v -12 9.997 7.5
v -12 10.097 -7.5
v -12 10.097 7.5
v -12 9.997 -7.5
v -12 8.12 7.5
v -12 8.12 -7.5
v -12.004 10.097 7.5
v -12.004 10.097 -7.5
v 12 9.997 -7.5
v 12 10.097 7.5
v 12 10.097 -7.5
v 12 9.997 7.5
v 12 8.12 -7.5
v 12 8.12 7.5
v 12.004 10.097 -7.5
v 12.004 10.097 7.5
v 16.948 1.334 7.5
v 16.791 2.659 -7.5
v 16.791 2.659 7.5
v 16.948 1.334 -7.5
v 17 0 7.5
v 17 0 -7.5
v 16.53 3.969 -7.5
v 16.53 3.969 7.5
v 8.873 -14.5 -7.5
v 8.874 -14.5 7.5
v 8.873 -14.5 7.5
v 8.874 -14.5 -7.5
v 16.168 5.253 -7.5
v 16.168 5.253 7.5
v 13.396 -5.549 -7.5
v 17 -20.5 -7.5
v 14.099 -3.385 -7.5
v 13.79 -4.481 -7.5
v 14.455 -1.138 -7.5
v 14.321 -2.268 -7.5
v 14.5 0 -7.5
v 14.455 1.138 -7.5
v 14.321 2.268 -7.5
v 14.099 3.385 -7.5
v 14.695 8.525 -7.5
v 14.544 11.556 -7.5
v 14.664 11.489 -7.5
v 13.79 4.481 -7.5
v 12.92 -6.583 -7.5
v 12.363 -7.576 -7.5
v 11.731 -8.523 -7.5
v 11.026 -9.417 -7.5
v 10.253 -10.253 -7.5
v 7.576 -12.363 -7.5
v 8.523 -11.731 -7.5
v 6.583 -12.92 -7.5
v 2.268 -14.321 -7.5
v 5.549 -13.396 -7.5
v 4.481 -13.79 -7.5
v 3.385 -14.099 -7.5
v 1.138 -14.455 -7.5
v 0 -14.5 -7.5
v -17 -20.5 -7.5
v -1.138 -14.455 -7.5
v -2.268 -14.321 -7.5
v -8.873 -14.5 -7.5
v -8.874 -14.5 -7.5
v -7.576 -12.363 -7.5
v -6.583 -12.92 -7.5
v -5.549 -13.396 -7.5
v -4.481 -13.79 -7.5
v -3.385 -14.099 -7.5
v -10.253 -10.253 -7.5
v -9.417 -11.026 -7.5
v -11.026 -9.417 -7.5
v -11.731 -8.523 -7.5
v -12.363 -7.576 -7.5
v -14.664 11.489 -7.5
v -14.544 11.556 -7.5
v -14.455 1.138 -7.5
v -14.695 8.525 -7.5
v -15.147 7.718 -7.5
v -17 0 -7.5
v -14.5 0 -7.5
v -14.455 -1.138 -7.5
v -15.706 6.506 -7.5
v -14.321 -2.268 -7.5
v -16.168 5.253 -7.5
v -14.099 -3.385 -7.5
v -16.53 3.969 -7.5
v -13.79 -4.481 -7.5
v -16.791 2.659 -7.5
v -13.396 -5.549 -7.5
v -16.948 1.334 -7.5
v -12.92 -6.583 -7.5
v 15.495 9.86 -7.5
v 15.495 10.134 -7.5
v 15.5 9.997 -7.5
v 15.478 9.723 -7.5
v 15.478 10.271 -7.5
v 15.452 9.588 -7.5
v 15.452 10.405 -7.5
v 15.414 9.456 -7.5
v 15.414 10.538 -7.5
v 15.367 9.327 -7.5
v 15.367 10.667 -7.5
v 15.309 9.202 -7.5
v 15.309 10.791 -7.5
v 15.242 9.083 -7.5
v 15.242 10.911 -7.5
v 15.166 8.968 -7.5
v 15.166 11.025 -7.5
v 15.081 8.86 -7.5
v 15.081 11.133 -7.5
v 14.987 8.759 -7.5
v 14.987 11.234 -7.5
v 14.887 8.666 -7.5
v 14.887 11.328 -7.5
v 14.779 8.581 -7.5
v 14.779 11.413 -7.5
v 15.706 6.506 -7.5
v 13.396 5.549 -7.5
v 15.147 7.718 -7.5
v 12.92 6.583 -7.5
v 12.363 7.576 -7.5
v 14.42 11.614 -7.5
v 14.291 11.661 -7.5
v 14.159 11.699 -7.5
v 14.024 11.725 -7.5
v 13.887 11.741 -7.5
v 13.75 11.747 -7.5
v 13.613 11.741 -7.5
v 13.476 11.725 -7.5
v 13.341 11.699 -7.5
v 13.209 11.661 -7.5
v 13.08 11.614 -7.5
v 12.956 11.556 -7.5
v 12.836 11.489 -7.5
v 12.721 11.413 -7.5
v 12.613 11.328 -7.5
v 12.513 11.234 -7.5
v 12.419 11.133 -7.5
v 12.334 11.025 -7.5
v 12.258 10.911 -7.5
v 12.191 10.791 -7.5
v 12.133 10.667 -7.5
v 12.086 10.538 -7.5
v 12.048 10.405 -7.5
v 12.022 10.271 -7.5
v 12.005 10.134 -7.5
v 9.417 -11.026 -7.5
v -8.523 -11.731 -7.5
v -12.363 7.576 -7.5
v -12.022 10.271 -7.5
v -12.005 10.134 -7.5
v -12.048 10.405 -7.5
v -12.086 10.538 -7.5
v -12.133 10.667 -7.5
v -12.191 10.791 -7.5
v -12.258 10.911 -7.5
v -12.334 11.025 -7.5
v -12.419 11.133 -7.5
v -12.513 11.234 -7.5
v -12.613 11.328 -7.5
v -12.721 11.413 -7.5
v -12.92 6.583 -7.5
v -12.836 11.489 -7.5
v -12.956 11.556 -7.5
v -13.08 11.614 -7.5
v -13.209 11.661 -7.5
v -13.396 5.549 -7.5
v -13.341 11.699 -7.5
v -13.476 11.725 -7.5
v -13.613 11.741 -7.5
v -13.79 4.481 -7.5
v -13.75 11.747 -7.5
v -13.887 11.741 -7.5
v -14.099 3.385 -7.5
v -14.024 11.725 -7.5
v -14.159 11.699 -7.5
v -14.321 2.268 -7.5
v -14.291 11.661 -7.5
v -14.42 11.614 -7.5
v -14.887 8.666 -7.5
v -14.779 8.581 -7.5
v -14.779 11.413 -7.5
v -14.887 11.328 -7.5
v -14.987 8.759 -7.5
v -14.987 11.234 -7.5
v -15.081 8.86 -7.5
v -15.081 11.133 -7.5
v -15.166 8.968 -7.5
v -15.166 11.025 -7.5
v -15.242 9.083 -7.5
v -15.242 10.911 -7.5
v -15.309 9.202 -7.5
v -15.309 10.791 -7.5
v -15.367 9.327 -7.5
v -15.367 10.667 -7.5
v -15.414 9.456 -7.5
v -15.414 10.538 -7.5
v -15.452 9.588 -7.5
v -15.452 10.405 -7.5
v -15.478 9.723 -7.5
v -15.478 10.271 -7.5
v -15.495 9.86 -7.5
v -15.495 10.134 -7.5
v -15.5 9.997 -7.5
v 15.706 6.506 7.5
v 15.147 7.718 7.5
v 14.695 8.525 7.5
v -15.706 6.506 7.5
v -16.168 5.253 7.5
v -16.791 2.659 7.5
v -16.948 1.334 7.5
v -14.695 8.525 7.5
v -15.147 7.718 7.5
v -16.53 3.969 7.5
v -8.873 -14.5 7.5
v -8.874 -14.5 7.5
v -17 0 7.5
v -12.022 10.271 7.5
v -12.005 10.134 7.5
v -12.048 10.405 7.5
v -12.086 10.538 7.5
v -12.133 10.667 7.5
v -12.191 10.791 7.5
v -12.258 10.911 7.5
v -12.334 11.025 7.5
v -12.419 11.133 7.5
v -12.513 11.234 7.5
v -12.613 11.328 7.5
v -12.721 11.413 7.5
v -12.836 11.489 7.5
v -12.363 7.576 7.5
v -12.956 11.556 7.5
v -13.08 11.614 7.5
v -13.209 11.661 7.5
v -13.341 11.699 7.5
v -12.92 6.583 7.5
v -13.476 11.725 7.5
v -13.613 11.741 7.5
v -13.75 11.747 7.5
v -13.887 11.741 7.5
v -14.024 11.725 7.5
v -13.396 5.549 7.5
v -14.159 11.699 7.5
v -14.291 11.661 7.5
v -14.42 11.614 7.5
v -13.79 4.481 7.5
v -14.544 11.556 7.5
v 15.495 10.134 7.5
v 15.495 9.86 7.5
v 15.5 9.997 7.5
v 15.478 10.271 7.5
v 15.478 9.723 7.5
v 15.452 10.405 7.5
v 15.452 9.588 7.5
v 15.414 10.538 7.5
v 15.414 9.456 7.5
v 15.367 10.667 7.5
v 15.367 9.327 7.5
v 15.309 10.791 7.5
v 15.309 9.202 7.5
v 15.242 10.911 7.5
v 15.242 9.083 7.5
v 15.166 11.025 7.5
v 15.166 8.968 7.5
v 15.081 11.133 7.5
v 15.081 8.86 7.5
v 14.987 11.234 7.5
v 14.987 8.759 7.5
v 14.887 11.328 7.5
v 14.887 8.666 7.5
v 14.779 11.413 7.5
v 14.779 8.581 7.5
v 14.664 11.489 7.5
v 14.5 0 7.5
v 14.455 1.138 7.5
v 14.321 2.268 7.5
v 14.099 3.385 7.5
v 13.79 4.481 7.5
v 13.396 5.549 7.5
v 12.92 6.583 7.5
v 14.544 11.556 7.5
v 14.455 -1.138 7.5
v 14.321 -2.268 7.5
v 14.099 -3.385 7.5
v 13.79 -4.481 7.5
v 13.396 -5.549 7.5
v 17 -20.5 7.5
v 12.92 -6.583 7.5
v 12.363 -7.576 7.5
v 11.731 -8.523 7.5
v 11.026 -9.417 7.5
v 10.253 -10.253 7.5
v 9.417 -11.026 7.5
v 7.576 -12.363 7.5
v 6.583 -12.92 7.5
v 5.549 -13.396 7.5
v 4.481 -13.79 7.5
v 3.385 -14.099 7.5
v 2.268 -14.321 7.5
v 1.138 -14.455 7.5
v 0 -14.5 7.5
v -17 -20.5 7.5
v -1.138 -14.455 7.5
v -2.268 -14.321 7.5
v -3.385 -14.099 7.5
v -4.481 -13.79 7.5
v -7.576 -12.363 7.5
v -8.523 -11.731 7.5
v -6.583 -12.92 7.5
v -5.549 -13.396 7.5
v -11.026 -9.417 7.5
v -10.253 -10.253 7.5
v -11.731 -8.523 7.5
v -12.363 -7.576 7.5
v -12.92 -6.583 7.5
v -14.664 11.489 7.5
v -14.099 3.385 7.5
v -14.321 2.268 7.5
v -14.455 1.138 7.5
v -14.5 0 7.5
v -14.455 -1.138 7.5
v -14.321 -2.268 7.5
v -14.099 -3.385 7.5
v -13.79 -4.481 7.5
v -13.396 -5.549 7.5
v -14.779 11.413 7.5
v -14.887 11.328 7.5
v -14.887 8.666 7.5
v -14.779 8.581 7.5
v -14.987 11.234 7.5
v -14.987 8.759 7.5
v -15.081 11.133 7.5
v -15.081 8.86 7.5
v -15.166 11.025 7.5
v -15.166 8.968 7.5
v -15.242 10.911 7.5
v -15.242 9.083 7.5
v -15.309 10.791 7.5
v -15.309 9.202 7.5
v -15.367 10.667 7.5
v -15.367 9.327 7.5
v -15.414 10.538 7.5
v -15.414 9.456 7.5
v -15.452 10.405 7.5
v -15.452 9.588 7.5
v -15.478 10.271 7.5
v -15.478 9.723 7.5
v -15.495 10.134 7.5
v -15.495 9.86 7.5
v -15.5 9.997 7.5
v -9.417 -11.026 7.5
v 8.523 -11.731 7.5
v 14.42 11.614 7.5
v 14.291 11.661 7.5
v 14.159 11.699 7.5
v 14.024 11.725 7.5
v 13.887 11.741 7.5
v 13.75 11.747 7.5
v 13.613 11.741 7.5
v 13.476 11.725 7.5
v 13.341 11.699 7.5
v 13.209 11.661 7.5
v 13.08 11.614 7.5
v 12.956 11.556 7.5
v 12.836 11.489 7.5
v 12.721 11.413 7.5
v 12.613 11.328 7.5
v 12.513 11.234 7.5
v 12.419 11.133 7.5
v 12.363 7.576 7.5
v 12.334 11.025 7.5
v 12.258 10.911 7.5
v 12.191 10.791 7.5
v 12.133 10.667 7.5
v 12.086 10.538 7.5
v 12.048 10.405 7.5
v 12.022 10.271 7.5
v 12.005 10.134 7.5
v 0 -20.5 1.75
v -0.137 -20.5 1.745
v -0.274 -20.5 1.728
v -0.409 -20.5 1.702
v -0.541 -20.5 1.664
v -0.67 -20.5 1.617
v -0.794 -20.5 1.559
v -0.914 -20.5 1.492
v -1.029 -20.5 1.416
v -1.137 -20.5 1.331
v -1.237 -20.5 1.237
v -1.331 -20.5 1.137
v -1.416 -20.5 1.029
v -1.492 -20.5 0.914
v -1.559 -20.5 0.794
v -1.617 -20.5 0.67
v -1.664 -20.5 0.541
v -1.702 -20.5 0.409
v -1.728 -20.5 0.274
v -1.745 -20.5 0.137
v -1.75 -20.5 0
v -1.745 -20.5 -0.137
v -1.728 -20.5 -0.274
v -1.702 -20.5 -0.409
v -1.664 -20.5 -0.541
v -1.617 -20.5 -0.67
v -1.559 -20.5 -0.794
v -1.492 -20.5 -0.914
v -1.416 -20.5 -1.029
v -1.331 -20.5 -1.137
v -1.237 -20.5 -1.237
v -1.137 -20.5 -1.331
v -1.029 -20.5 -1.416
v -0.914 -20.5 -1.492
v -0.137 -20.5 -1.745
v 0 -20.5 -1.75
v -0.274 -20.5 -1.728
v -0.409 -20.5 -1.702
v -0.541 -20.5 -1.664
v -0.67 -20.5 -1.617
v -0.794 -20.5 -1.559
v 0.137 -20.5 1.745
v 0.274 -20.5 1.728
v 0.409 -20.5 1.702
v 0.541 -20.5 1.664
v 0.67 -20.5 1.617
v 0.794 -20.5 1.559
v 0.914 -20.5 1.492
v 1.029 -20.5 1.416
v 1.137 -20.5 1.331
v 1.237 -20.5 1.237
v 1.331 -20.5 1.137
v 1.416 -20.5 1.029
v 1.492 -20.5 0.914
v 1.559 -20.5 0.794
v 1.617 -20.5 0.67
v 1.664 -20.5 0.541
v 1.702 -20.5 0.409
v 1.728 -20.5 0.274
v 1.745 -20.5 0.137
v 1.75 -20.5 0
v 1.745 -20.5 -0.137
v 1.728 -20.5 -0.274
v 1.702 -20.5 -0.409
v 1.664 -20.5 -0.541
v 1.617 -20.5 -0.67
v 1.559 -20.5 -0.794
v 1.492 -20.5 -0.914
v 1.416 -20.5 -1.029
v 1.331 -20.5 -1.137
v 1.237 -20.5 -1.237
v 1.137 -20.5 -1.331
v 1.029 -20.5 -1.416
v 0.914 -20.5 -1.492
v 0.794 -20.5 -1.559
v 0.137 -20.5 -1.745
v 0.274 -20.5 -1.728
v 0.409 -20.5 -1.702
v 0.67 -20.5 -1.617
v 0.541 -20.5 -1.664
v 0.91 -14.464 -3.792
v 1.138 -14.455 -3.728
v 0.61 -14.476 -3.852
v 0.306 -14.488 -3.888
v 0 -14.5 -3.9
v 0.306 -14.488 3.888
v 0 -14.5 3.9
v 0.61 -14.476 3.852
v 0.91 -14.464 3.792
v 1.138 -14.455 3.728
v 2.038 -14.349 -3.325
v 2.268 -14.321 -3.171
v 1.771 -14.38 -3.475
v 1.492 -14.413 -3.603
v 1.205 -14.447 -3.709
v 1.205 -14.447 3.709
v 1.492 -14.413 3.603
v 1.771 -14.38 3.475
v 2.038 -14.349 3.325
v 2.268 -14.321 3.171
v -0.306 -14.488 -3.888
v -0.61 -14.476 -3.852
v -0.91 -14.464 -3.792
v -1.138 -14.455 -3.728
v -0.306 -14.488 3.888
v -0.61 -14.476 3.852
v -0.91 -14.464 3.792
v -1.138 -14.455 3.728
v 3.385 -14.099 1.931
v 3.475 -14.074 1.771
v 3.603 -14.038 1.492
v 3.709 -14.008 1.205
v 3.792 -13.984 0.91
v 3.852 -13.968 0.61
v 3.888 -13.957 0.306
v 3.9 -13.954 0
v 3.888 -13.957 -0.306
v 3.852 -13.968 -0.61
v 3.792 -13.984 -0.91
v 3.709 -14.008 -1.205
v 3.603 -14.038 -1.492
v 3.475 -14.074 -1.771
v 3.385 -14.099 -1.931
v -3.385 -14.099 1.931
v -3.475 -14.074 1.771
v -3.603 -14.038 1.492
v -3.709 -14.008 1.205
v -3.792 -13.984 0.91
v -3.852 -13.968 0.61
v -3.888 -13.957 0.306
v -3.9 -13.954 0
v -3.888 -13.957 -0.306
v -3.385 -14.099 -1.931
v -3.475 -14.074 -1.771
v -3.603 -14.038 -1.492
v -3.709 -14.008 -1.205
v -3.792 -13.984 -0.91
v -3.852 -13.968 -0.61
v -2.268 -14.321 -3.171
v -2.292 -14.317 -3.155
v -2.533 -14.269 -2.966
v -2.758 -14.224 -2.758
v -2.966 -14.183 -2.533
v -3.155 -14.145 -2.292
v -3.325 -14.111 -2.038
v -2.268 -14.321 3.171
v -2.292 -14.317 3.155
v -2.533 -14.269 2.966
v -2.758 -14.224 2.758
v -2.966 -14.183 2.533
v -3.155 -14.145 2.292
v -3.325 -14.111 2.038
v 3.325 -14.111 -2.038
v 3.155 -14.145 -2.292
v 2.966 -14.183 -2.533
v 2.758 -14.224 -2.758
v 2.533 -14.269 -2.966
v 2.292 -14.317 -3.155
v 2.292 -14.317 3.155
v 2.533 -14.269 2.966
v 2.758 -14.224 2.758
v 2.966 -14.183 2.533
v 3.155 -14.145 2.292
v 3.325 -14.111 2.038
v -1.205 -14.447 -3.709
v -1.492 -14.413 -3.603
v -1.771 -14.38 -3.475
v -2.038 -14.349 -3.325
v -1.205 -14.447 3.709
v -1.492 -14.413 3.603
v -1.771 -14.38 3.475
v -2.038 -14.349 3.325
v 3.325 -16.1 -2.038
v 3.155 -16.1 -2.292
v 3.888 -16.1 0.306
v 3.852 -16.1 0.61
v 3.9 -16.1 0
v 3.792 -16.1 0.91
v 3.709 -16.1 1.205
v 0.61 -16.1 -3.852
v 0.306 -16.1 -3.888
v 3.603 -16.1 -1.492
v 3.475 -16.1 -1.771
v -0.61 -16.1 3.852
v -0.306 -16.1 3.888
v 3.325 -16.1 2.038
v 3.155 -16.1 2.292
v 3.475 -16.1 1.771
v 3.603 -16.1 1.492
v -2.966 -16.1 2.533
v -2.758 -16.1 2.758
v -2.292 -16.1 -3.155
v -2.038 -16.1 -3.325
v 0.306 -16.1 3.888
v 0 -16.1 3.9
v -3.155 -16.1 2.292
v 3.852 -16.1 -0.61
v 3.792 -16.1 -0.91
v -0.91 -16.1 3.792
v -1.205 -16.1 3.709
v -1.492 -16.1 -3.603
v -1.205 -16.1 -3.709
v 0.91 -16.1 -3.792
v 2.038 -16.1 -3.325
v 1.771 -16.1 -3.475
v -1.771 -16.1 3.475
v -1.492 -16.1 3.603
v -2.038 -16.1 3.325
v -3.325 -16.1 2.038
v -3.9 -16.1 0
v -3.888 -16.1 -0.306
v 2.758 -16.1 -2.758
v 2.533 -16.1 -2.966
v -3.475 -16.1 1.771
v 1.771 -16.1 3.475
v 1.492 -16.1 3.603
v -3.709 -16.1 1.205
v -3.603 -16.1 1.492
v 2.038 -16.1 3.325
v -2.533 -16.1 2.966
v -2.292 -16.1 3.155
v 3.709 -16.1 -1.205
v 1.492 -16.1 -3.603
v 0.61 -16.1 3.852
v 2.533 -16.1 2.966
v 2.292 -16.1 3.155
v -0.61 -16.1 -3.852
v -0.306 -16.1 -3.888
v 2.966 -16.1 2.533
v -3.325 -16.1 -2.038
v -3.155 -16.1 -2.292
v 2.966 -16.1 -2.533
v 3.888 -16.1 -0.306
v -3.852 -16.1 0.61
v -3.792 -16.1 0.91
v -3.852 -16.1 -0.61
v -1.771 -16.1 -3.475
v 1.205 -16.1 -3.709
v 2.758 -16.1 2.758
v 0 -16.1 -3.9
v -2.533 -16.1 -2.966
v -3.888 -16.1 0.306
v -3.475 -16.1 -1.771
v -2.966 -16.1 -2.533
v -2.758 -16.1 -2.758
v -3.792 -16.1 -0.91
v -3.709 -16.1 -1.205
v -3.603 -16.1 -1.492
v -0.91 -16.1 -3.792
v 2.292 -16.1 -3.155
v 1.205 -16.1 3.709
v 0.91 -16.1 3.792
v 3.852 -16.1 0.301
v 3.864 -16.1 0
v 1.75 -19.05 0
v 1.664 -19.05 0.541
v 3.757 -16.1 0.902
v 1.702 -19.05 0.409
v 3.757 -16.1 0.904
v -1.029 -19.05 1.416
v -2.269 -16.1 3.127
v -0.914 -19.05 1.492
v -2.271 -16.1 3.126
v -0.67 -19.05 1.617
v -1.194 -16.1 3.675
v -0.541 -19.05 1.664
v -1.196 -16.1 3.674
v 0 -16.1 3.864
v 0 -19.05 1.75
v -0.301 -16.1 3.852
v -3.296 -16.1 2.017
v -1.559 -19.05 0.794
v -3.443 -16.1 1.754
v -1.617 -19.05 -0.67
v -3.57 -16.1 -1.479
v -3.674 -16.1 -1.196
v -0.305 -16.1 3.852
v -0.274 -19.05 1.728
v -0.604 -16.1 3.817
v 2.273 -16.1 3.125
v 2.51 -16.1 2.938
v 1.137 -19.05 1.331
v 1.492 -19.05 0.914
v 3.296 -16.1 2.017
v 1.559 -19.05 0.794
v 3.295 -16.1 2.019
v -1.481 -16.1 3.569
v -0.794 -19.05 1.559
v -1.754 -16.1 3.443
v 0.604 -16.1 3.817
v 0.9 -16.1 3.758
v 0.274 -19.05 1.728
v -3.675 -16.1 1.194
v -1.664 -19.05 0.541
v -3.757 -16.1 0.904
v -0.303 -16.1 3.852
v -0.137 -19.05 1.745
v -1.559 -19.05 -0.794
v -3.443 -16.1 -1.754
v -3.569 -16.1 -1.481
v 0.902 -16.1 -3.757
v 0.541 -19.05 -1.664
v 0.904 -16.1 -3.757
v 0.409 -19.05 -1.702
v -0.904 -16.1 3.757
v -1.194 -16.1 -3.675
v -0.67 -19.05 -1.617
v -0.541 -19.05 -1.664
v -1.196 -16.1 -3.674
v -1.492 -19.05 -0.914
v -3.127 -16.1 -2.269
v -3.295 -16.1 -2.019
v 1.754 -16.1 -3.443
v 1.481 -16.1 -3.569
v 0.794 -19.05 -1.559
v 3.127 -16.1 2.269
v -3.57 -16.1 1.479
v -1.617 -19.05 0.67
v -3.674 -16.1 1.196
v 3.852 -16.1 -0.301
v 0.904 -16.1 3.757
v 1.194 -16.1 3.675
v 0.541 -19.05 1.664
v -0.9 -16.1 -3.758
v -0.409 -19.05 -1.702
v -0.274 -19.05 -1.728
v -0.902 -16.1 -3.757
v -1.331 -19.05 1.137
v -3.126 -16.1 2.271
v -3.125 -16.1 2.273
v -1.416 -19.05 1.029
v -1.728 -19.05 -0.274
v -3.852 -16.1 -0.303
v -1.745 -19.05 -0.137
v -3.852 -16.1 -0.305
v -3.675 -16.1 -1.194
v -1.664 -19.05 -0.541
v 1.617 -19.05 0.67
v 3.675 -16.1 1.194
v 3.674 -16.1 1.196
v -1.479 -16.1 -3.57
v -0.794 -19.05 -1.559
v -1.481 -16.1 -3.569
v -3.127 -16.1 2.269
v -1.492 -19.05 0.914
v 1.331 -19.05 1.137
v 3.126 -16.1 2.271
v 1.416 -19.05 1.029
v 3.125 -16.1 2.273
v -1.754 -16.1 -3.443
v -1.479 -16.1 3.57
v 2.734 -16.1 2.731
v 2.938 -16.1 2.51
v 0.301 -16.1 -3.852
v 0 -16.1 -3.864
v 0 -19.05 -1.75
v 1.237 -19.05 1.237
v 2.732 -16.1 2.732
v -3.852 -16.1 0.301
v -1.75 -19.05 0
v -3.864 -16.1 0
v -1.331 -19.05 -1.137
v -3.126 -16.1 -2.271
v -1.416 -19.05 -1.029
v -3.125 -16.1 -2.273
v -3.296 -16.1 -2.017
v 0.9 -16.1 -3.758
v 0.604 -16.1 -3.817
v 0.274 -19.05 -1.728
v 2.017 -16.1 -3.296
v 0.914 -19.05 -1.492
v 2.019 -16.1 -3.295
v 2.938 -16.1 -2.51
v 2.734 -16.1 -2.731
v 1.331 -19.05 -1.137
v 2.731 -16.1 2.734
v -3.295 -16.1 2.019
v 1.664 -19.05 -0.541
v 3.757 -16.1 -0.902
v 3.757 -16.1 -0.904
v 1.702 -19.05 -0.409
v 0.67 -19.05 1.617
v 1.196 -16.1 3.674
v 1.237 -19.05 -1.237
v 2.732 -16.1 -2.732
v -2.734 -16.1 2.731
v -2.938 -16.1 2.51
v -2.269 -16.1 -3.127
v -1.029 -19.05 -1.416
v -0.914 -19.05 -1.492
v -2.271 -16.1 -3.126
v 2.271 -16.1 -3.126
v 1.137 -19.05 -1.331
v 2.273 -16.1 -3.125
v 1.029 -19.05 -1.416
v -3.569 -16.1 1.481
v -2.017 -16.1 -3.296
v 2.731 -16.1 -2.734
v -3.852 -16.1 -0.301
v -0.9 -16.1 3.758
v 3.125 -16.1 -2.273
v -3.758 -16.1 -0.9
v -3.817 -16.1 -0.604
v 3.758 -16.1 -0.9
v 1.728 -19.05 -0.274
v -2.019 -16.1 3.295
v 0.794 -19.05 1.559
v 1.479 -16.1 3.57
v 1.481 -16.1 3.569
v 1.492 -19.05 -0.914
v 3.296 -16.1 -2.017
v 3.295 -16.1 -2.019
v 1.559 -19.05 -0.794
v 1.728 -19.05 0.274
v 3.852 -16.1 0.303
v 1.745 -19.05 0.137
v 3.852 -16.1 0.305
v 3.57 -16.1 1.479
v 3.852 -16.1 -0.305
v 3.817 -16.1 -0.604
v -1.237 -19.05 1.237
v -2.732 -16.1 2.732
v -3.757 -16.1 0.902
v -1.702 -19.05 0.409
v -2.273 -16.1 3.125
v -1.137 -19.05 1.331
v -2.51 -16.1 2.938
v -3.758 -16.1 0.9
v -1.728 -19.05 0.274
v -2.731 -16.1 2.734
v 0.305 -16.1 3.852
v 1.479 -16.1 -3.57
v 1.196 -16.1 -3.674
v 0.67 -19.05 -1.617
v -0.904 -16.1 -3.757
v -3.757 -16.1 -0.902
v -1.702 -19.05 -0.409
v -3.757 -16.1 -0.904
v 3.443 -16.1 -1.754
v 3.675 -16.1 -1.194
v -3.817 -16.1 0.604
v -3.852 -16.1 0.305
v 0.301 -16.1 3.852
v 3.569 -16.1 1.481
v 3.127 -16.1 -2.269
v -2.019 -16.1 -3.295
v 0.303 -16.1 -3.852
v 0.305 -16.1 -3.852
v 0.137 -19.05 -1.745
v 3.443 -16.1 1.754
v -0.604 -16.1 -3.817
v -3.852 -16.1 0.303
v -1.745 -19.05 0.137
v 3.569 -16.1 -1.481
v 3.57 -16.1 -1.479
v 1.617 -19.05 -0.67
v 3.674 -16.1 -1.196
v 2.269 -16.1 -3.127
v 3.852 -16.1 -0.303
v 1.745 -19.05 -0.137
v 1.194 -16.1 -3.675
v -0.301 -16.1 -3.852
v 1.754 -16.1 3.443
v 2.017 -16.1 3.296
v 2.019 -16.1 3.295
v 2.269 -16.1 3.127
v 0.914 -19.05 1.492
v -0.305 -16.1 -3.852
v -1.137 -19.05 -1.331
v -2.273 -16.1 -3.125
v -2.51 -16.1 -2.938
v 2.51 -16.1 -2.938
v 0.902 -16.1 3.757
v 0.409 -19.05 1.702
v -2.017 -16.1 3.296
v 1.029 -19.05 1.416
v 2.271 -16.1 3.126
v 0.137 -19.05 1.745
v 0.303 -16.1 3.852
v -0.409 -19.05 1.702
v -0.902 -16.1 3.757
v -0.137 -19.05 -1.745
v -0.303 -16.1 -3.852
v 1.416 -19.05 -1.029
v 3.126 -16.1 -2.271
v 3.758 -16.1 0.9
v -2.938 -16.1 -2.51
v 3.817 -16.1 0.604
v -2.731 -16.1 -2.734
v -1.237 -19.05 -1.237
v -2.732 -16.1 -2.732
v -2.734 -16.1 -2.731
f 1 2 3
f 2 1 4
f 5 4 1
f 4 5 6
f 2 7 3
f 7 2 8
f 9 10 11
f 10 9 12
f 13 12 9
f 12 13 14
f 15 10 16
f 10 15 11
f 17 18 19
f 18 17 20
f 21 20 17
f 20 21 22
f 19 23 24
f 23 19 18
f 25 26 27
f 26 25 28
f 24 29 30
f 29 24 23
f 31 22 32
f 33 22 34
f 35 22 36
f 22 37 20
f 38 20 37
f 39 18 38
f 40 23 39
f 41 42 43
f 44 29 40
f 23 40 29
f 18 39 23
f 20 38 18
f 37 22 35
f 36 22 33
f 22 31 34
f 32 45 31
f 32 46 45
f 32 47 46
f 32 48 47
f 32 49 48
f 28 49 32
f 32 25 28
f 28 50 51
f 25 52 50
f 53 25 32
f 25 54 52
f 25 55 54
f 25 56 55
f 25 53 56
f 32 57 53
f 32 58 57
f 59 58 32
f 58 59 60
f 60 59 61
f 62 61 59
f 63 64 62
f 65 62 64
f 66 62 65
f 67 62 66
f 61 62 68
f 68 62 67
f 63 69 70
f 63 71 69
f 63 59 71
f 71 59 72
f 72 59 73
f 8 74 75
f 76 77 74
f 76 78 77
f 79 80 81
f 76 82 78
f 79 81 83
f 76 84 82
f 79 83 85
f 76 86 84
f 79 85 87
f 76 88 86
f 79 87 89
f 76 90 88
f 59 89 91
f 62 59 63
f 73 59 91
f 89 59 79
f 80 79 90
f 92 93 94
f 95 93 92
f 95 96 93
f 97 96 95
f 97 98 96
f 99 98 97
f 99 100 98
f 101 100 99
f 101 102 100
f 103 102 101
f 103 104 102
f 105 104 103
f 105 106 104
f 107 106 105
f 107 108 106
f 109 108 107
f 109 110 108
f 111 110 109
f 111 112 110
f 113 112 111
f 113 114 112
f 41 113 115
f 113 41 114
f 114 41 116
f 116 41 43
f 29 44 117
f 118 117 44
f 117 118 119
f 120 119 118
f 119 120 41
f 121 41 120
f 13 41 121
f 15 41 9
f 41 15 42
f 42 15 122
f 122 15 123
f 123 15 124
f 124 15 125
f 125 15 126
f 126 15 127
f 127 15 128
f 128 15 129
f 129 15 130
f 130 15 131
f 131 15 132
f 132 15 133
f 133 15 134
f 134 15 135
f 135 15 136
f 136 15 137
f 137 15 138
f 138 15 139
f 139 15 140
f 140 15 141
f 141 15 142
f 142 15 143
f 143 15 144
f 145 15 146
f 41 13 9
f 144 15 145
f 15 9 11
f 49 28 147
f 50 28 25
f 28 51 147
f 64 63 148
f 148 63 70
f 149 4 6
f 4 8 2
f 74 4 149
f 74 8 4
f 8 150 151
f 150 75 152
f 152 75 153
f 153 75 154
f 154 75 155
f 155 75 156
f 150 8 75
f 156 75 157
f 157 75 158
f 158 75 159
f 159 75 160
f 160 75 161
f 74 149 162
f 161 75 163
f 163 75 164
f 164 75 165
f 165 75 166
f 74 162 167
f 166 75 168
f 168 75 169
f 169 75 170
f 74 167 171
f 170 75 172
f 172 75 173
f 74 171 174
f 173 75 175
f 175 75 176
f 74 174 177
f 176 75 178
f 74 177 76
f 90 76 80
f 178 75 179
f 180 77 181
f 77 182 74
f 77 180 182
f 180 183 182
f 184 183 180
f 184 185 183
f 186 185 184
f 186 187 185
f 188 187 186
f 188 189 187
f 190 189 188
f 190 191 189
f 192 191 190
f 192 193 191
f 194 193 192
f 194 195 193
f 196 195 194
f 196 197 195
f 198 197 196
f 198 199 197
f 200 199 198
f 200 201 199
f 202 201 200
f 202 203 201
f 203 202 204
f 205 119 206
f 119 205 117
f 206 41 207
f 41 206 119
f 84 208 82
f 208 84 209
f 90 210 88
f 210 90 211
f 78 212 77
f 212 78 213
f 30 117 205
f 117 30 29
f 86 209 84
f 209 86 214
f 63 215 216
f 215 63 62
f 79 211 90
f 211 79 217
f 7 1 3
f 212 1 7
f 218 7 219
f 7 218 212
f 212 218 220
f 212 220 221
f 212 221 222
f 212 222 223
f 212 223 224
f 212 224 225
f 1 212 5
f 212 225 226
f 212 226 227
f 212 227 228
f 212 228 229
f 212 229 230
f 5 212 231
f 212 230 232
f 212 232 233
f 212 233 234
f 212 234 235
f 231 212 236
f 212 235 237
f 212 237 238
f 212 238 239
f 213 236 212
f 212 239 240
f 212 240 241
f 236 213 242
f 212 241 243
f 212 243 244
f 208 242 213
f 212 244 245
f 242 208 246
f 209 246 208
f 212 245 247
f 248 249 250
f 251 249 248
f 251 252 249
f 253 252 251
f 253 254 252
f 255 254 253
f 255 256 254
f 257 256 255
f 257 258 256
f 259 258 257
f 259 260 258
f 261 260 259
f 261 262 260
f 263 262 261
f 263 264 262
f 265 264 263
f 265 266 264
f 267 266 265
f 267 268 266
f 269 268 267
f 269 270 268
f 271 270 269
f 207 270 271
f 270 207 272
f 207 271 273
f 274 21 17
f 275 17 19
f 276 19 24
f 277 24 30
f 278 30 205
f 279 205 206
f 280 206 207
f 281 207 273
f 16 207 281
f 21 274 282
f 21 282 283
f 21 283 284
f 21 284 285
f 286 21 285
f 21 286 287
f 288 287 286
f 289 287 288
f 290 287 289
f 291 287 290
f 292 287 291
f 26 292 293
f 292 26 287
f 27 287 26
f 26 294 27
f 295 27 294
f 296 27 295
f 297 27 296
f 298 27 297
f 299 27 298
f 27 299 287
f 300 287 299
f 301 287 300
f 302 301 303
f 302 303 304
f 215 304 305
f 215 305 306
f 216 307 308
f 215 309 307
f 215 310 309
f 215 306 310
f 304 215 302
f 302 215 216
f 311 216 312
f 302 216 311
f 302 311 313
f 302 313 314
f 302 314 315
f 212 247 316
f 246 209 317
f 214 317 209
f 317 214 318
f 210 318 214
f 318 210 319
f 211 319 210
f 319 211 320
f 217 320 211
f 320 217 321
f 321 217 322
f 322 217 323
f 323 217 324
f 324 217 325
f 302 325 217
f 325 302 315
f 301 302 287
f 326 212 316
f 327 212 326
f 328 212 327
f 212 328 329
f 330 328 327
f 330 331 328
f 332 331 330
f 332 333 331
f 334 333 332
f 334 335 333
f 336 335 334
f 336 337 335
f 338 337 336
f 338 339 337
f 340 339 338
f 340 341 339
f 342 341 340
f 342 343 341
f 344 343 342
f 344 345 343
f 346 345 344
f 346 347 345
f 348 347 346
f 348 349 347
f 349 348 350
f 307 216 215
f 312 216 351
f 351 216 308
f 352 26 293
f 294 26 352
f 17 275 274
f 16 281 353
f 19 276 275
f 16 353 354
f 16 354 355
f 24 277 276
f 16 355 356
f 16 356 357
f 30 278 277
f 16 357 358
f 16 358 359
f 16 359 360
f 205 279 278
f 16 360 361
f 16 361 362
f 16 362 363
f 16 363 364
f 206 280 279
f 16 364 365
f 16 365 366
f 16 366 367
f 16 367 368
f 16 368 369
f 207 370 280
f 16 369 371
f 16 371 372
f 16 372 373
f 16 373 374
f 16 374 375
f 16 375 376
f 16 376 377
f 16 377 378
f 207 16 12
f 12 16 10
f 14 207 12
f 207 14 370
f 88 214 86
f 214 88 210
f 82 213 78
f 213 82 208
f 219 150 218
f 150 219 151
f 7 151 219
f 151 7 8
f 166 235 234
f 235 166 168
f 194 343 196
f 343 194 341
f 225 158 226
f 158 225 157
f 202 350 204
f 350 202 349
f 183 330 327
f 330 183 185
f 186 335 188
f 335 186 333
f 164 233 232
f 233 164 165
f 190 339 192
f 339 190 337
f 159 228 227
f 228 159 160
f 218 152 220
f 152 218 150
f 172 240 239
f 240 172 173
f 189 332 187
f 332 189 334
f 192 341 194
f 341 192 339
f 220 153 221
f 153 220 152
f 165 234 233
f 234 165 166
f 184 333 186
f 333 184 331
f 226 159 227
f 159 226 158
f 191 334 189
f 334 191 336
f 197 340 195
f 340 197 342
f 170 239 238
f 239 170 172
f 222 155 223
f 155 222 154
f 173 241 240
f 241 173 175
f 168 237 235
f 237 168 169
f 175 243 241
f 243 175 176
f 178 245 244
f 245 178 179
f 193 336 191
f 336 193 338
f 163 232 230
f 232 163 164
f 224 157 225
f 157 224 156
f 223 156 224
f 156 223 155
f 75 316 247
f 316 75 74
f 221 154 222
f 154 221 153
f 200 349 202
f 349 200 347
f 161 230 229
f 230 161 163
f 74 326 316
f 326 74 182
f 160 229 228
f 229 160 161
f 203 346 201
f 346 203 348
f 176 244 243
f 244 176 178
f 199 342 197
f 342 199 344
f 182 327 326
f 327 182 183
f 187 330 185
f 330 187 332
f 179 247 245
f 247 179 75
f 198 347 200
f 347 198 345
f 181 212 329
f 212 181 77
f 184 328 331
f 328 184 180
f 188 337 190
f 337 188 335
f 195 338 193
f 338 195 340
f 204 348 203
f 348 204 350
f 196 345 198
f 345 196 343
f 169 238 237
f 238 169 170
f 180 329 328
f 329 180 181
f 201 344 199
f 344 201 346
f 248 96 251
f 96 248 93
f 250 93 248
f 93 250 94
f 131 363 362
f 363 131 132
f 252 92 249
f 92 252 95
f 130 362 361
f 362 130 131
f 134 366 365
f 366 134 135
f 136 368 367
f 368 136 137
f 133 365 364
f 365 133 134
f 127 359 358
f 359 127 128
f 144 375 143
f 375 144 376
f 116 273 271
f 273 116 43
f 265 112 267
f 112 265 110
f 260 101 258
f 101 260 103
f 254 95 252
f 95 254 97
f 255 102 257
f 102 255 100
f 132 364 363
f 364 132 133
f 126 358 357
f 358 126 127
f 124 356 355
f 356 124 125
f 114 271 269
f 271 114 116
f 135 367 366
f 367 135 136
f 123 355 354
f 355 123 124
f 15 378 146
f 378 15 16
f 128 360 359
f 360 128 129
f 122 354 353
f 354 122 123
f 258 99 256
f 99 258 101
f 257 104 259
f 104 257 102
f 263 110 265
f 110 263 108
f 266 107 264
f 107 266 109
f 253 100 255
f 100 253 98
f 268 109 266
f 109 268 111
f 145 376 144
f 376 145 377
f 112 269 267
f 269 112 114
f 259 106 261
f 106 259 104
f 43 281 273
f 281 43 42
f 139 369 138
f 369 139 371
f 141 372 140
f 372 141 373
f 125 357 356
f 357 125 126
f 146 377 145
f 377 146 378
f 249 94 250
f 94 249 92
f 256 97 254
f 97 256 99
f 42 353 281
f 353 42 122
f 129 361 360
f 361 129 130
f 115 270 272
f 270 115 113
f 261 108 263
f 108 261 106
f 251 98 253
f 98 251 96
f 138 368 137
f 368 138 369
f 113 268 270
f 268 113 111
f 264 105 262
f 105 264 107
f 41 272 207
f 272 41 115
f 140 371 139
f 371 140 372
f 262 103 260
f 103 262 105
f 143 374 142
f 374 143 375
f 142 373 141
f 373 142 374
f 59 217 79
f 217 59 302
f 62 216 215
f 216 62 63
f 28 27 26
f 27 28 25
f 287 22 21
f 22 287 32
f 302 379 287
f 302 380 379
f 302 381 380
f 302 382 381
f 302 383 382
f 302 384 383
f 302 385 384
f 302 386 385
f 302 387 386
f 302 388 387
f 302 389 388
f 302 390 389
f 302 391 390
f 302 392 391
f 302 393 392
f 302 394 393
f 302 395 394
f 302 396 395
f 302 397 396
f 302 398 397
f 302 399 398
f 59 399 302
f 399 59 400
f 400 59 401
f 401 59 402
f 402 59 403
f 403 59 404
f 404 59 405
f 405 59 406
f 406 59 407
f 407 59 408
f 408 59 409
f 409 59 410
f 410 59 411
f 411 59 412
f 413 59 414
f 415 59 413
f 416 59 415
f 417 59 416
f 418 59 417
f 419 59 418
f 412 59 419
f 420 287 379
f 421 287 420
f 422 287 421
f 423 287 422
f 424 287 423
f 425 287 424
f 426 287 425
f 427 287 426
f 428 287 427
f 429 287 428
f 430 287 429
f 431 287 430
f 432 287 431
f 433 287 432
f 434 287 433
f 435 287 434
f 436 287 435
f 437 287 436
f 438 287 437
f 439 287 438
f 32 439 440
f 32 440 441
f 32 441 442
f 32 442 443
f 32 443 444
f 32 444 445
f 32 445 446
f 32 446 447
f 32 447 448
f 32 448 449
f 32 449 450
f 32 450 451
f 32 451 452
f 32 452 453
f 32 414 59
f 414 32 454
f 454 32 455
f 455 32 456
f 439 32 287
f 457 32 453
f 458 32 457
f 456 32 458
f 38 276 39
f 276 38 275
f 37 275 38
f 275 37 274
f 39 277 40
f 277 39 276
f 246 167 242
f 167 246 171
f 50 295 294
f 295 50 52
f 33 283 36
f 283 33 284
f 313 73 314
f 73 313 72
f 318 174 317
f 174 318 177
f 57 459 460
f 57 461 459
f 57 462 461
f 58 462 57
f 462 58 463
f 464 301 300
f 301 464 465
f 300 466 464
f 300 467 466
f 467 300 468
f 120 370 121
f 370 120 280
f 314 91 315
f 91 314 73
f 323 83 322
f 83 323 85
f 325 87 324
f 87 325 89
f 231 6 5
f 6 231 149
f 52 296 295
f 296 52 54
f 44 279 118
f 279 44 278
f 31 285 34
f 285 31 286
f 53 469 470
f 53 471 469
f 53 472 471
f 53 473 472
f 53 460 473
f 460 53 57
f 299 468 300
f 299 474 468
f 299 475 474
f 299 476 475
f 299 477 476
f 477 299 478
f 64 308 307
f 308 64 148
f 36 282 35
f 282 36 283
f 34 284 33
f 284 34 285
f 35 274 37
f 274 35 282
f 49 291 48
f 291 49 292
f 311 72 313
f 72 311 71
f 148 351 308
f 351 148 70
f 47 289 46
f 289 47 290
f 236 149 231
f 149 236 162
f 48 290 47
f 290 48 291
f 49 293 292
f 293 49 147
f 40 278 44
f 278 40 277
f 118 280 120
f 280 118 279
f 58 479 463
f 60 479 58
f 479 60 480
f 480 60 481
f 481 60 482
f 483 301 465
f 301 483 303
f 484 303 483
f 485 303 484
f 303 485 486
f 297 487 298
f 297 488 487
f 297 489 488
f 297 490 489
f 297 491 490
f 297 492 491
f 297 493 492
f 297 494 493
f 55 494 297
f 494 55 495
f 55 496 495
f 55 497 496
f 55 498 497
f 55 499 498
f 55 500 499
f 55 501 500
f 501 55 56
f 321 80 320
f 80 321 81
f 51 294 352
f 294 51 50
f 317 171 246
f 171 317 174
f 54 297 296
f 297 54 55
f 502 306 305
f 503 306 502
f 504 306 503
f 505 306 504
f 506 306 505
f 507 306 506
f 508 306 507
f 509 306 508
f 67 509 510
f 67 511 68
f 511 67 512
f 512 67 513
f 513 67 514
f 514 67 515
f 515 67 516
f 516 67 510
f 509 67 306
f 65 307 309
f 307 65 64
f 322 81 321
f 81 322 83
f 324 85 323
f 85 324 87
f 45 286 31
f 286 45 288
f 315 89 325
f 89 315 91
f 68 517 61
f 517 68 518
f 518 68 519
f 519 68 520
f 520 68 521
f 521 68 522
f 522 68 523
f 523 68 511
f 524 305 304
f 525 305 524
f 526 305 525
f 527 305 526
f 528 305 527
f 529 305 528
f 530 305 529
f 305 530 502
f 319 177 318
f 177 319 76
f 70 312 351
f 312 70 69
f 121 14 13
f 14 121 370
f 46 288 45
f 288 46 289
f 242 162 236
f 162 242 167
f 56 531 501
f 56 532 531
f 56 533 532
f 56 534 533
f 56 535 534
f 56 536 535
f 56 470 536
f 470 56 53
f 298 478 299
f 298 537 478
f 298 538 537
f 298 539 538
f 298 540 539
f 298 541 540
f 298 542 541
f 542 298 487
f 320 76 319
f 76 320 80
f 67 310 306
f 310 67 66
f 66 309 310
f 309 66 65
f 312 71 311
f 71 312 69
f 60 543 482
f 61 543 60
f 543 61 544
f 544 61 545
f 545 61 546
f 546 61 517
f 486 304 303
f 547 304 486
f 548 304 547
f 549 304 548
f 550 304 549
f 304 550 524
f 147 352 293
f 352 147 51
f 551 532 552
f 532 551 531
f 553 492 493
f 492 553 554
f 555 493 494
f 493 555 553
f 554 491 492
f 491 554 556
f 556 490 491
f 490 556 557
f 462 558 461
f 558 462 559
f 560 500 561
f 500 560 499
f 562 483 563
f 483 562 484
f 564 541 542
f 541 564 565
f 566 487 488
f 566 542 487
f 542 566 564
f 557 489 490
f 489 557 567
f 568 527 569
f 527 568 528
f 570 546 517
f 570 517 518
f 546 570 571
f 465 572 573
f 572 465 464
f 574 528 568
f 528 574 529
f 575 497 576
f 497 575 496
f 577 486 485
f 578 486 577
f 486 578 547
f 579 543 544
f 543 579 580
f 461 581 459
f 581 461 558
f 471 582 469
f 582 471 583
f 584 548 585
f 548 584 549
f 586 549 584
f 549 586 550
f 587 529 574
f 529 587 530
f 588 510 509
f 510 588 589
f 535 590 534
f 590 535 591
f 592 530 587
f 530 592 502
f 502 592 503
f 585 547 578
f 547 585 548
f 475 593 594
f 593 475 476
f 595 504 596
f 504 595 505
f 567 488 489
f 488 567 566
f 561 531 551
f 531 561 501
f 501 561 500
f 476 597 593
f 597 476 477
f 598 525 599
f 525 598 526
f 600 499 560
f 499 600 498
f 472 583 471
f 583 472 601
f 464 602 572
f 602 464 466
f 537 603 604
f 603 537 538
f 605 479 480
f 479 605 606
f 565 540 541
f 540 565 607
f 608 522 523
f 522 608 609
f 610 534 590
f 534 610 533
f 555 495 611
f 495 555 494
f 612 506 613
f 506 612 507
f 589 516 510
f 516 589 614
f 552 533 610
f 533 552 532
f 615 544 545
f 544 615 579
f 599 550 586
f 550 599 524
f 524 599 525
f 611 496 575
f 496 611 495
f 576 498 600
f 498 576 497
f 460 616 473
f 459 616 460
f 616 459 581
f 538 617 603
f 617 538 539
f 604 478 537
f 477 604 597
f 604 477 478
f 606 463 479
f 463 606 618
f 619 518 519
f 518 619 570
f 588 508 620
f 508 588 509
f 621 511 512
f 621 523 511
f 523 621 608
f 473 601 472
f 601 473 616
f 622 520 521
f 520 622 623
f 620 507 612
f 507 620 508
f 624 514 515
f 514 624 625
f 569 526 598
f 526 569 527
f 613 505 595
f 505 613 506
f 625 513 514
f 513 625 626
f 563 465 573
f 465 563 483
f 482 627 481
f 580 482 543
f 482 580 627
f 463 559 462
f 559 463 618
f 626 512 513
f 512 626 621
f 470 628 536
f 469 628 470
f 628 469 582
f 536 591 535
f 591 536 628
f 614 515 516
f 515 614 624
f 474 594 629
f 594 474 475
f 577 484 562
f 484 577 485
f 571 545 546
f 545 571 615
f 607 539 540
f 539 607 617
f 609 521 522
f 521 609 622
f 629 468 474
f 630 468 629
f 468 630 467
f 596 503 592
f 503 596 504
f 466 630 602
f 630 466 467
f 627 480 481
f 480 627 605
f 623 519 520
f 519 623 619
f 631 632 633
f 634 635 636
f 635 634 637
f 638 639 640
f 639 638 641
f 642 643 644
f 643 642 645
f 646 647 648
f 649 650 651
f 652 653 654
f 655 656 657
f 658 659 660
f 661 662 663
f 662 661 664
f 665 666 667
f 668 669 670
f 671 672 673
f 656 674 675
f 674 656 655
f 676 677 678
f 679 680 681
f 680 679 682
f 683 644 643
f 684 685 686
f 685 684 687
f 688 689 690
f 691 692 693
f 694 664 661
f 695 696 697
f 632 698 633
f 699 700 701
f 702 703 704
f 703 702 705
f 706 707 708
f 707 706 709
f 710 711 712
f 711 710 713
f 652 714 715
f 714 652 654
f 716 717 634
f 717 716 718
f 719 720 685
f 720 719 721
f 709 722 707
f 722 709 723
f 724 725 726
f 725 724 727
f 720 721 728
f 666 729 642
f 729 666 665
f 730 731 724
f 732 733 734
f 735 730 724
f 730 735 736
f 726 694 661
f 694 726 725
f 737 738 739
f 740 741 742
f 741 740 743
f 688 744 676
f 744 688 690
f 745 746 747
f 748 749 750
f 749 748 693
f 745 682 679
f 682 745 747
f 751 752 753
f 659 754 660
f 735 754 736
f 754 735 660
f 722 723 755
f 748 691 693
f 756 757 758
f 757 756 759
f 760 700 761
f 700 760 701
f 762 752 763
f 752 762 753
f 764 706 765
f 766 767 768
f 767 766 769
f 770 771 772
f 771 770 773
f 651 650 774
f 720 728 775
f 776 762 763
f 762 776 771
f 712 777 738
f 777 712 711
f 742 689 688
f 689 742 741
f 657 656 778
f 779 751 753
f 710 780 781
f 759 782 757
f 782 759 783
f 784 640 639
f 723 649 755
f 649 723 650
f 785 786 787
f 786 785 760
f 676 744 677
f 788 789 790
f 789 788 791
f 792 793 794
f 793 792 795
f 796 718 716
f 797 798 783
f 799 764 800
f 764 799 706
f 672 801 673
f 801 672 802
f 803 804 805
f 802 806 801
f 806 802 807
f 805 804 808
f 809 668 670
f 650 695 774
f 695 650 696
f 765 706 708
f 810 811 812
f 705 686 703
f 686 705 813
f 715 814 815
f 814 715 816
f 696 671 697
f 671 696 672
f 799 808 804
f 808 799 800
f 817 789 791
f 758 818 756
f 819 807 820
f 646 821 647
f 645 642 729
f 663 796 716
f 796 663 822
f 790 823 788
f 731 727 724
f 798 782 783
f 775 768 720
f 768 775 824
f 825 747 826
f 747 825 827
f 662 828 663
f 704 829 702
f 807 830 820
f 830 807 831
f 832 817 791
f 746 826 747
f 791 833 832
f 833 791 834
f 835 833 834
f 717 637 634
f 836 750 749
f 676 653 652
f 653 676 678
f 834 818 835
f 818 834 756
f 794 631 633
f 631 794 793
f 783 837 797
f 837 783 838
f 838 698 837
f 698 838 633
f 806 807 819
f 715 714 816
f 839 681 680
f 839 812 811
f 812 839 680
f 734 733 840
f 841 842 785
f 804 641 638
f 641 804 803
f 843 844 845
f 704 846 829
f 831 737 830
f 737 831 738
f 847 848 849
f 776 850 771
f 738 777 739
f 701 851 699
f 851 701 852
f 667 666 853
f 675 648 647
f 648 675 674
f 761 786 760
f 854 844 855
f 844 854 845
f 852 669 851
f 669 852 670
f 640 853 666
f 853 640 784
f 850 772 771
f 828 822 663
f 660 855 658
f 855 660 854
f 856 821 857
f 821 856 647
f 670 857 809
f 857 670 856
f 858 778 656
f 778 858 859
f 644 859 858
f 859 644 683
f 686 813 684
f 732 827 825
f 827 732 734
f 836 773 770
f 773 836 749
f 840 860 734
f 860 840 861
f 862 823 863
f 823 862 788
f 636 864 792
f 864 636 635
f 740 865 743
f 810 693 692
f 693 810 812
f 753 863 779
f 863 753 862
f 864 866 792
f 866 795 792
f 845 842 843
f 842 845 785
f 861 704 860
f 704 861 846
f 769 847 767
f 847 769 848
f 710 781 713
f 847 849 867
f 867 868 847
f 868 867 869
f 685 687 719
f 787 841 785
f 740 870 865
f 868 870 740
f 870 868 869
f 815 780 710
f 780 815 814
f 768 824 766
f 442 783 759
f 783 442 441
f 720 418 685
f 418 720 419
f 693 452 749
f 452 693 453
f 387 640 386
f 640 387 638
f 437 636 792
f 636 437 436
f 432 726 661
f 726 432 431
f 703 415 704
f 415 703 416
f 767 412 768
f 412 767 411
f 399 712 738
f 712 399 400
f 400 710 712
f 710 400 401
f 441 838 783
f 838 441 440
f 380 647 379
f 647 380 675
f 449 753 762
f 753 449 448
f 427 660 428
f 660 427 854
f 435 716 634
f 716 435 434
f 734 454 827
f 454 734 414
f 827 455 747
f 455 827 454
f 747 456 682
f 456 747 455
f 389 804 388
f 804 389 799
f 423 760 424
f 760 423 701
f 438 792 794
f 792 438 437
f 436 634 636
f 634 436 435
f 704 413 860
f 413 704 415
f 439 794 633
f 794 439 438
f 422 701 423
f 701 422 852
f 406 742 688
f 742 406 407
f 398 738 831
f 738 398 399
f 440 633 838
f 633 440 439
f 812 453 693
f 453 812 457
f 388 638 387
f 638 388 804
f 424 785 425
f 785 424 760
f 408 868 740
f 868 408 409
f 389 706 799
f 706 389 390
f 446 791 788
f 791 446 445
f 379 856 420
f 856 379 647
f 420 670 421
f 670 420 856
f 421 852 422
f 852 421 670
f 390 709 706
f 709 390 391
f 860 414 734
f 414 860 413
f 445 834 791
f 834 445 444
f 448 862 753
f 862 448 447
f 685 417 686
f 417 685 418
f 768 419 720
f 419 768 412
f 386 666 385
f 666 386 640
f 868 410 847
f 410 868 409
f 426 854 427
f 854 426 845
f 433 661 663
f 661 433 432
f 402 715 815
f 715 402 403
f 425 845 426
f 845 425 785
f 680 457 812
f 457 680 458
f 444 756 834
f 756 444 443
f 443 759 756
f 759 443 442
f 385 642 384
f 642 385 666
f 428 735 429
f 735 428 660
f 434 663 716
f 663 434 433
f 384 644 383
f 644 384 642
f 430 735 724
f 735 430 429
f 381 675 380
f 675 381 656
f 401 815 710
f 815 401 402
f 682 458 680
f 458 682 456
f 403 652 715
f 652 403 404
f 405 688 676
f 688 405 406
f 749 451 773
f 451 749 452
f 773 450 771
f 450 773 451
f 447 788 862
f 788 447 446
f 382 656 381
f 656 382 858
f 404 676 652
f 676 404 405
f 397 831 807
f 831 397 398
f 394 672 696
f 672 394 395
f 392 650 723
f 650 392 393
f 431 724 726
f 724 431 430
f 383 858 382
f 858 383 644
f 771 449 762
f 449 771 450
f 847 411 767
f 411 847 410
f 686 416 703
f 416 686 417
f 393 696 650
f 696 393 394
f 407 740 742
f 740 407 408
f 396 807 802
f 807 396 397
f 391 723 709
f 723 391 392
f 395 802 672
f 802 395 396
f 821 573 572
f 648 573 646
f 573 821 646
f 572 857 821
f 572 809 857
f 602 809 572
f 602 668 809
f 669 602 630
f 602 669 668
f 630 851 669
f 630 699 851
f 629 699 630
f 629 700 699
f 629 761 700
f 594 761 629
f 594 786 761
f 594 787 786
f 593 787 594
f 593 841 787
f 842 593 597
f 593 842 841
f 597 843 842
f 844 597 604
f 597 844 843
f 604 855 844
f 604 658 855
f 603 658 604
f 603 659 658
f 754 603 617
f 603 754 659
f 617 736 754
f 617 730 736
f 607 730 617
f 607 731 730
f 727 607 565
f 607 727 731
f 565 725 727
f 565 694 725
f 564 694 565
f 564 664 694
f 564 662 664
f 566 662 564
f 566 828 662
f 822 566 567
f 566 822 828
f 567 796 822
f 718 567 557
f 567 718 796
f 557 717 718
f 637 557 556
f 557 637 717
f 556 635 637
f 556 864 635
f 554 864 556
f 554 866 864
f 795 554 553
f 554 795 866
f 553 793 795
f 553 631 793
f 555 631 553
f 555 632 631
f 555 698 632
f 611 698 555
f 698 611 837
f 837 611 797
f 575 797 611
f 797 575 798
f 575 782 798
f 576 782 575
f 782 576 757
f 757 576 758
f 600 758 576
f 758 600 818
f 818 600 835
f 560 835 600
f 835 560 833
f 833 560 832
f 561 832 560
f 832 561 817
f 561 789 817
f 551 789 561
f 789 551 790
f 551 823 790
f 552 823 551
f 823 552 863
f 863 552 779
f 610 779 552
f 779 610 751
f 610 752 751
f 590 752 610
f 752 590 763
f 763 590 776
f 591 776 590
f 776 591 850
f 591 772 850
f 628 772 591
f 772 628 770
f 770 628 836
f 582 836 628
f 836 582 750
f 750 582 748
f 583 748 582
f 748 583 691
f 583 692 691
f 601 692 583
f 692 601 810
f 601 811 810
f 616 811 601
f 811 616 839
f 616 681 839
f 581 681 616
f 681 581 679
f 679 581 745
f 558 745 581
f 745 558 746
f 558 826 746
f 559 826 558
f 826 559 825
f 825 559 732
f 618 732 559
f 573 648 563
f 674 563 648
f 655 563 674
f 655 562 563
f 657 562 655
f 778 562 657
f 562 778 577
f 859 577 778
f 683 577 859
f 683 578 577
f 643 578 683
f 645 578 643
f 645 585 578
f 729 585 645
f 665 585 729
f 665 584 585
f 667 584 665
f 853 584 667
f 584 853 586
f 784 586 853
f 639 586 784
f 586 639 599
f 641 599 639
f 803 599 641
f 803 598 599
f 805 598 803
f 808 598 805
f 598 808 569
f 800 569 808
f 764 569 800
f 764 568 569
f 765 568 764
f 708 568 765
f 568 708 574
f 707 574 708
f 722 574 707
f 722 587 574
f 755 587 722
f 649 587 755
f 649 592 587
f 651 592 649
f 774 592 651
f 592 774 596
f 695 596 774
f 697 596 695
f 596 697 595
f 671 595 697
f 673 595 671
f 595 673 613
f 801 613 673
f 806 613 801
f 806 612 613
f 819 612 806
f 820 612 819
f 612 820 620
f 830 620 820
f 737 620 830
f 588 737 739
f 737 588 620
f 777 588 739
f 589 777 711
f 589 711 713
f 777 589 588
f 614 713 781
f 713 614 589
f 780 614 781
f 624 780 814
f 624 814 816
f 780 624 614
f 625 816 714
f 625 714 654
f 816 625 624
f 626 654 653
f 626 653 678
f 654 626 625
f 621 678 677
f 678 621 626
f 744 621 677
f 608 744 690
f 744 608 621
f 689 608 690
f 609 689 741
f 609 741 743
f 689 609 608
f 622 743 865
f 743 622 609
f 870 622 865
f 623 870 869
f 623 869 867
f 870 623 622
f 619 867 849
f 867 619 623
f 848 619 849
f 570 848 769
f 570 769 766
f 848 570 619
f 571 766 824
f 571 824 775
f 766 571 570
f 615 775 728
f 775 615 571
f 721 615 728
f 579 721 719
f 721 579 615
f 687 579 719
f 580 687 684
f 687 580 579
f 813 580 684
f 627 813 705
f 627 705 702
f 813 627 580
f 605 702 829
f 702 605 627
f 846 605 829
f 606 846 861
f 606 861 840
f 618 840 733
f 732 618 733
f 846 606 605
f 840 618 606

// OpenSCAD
// Adaptive pipe clamp

// Clamp dimensions
pipe_diameter = 29.0;
wall_thickness = 2.5;
clamp_depth = 15.0;
clamp_opening_width = pipe_diameter - 1.5;

// Mounting base
base_height = 6.0;
base_corner_bevel = 0.0;

// Fastener dimensions
screw_head_diameter = 7.8;
screw_head_height = 3.0;
screw_stem_diameter = 3.1;
printing_clearance = 0.4;
screw_tool_overlap = 0.1;
screw_head_sink_depth = 1.5;

// Rendering and boolean-operation tolerances
render_resolution = 80;
preview_epsilon = 0.1;
$fn = render_resolution;

// Derived geometry
inner_radius = pipe_diameter / 2;
outer_radius = inner_radius + wall_thickness;
entry_bead_radius = wall_thickness * 0.7;
wing_intersection_x = sqrt(max(0, outer_radius * outer_radius - inner_radius * inner_radius));
base_width = 2 * (outer_radius + base_corner_bevel);
bead_center_y = sqrt(max(0, outer_radius * outer_radius - pow(clamp_opening_width / 2, 2)));
bead_gap_width = clamp_opening_width - 2 * entry_bead_radius;
inner_pipe_wall_y = -inner_radius;
screw_seat_y = inner_pipe_wall_y - screw_head_sink_depth;

module screw_hole_tool() {
    stem_hole_diameter = screw_stem_diameter + printing_clearance;
    tunnel_length = screw_head_sink_depth + 5;

    // Form the screw head seat, transition, and stem hole.
    translate([0, screw_seat_y, 0])
    rotate([90, 0, 0]) {
        cylinder(h = screw_tool_overlap, r = screw_head_diameter / 2, center = true);

        translate([0, 0, screw_tool_overlap / 2])
        cylinder(
            h = screw_head_height,
            r1 = screw_head_diameter / 2,
            r2 = stem_hole_diameter / 2
        );

        translate([0, 0, screw_head_height])
        cylinder(h = base_height + 10, r = stem_hole_diameter / 2);
    }

    // Provide access to the recessed screw head.
    translate([0, screw_seat_y + tunnel_length / 2 - preview_epsilon, 0])
    rotate([90, 0, 0])
    cylinder(h = tunnel_length, r = screw_head_diameter / 2, center = true);
}

module upper_grip() {
    union() {
        // Cut the opening and bead reliefs from the clamp ring.
        difference() {
            cylinder(h = clamp_depth, r = outer_radius, center = true);

            translate([0, outer_radius + preview_epsilon, 0])
            cube([bead_gap_width, 2 * outer_radius, clamp_depth + 2], center = true);

            for (side = [-1, 1]) {
                translate([
                    side * clamp_opening_width / 2,
                    bead_center_y + outer_radius + preview_epsilon,
                    0
                ])
                cube([2 * entry_bead_radius, 2 * outer_radius, clamp_depth + 2], center = true);
            }
        }

        // Add rounded lead-in beads at both sides of the opening.
        for (side = [-1, 1]) {
            translate([side * clamp_opening_width / 2, bead_center_y, 0])
            cylinder(h = clamp_depth, r = entry_bead_radius, center = true);
        }
    }
}

module clamp_body() {
    wing_width = abs(outer_radius - wing_intersection_x);
    wing_height = abs(inner_pipe_wall_y);

    difference() {
        union() {
            upper_grip();

            // Join the mounting base to the clamp ring.
            translate([0, -inner_radius - base_height / 2, 0])
            cube([base_width, base_height, clamp_depth], center = true);

            // Add support wings beneath the ring.
            for (side = [-1, 1]) {
                translate([
                    side == 1 ? outer_radius - wing_width : -outer_radius,
                    inner_pipe_wall_y,
                    -clamp_depth / 2
                ])
                cube([wing_width, wing_height, clamp_depth], center = false);
            }
        }

        // Clear the pipe bore through the ring and support wings.
        cylinder(h = clamp_depth + 2, r = inner_radius, center = true);

        // Cut the optional bevels at the mounting-base corners.
        for (side = [-1, 1]) {
            translate([
                side * (base_width / 2 + preview_epsilon),
                -inner_radius + preview_epsilon,
                0
            ])
            rotate([0, 0, side * 45])
            cube([
                base_corner_bevel * sqrt(2),
                base_corner_bevel * sqrt(2),
                clamp_depth + 2
            ], center = true);
        }
    }
}

// Subtract the fastener tool from the clamp body.
difference() {
    clamp_body();
    screw_hole_tool();
}
